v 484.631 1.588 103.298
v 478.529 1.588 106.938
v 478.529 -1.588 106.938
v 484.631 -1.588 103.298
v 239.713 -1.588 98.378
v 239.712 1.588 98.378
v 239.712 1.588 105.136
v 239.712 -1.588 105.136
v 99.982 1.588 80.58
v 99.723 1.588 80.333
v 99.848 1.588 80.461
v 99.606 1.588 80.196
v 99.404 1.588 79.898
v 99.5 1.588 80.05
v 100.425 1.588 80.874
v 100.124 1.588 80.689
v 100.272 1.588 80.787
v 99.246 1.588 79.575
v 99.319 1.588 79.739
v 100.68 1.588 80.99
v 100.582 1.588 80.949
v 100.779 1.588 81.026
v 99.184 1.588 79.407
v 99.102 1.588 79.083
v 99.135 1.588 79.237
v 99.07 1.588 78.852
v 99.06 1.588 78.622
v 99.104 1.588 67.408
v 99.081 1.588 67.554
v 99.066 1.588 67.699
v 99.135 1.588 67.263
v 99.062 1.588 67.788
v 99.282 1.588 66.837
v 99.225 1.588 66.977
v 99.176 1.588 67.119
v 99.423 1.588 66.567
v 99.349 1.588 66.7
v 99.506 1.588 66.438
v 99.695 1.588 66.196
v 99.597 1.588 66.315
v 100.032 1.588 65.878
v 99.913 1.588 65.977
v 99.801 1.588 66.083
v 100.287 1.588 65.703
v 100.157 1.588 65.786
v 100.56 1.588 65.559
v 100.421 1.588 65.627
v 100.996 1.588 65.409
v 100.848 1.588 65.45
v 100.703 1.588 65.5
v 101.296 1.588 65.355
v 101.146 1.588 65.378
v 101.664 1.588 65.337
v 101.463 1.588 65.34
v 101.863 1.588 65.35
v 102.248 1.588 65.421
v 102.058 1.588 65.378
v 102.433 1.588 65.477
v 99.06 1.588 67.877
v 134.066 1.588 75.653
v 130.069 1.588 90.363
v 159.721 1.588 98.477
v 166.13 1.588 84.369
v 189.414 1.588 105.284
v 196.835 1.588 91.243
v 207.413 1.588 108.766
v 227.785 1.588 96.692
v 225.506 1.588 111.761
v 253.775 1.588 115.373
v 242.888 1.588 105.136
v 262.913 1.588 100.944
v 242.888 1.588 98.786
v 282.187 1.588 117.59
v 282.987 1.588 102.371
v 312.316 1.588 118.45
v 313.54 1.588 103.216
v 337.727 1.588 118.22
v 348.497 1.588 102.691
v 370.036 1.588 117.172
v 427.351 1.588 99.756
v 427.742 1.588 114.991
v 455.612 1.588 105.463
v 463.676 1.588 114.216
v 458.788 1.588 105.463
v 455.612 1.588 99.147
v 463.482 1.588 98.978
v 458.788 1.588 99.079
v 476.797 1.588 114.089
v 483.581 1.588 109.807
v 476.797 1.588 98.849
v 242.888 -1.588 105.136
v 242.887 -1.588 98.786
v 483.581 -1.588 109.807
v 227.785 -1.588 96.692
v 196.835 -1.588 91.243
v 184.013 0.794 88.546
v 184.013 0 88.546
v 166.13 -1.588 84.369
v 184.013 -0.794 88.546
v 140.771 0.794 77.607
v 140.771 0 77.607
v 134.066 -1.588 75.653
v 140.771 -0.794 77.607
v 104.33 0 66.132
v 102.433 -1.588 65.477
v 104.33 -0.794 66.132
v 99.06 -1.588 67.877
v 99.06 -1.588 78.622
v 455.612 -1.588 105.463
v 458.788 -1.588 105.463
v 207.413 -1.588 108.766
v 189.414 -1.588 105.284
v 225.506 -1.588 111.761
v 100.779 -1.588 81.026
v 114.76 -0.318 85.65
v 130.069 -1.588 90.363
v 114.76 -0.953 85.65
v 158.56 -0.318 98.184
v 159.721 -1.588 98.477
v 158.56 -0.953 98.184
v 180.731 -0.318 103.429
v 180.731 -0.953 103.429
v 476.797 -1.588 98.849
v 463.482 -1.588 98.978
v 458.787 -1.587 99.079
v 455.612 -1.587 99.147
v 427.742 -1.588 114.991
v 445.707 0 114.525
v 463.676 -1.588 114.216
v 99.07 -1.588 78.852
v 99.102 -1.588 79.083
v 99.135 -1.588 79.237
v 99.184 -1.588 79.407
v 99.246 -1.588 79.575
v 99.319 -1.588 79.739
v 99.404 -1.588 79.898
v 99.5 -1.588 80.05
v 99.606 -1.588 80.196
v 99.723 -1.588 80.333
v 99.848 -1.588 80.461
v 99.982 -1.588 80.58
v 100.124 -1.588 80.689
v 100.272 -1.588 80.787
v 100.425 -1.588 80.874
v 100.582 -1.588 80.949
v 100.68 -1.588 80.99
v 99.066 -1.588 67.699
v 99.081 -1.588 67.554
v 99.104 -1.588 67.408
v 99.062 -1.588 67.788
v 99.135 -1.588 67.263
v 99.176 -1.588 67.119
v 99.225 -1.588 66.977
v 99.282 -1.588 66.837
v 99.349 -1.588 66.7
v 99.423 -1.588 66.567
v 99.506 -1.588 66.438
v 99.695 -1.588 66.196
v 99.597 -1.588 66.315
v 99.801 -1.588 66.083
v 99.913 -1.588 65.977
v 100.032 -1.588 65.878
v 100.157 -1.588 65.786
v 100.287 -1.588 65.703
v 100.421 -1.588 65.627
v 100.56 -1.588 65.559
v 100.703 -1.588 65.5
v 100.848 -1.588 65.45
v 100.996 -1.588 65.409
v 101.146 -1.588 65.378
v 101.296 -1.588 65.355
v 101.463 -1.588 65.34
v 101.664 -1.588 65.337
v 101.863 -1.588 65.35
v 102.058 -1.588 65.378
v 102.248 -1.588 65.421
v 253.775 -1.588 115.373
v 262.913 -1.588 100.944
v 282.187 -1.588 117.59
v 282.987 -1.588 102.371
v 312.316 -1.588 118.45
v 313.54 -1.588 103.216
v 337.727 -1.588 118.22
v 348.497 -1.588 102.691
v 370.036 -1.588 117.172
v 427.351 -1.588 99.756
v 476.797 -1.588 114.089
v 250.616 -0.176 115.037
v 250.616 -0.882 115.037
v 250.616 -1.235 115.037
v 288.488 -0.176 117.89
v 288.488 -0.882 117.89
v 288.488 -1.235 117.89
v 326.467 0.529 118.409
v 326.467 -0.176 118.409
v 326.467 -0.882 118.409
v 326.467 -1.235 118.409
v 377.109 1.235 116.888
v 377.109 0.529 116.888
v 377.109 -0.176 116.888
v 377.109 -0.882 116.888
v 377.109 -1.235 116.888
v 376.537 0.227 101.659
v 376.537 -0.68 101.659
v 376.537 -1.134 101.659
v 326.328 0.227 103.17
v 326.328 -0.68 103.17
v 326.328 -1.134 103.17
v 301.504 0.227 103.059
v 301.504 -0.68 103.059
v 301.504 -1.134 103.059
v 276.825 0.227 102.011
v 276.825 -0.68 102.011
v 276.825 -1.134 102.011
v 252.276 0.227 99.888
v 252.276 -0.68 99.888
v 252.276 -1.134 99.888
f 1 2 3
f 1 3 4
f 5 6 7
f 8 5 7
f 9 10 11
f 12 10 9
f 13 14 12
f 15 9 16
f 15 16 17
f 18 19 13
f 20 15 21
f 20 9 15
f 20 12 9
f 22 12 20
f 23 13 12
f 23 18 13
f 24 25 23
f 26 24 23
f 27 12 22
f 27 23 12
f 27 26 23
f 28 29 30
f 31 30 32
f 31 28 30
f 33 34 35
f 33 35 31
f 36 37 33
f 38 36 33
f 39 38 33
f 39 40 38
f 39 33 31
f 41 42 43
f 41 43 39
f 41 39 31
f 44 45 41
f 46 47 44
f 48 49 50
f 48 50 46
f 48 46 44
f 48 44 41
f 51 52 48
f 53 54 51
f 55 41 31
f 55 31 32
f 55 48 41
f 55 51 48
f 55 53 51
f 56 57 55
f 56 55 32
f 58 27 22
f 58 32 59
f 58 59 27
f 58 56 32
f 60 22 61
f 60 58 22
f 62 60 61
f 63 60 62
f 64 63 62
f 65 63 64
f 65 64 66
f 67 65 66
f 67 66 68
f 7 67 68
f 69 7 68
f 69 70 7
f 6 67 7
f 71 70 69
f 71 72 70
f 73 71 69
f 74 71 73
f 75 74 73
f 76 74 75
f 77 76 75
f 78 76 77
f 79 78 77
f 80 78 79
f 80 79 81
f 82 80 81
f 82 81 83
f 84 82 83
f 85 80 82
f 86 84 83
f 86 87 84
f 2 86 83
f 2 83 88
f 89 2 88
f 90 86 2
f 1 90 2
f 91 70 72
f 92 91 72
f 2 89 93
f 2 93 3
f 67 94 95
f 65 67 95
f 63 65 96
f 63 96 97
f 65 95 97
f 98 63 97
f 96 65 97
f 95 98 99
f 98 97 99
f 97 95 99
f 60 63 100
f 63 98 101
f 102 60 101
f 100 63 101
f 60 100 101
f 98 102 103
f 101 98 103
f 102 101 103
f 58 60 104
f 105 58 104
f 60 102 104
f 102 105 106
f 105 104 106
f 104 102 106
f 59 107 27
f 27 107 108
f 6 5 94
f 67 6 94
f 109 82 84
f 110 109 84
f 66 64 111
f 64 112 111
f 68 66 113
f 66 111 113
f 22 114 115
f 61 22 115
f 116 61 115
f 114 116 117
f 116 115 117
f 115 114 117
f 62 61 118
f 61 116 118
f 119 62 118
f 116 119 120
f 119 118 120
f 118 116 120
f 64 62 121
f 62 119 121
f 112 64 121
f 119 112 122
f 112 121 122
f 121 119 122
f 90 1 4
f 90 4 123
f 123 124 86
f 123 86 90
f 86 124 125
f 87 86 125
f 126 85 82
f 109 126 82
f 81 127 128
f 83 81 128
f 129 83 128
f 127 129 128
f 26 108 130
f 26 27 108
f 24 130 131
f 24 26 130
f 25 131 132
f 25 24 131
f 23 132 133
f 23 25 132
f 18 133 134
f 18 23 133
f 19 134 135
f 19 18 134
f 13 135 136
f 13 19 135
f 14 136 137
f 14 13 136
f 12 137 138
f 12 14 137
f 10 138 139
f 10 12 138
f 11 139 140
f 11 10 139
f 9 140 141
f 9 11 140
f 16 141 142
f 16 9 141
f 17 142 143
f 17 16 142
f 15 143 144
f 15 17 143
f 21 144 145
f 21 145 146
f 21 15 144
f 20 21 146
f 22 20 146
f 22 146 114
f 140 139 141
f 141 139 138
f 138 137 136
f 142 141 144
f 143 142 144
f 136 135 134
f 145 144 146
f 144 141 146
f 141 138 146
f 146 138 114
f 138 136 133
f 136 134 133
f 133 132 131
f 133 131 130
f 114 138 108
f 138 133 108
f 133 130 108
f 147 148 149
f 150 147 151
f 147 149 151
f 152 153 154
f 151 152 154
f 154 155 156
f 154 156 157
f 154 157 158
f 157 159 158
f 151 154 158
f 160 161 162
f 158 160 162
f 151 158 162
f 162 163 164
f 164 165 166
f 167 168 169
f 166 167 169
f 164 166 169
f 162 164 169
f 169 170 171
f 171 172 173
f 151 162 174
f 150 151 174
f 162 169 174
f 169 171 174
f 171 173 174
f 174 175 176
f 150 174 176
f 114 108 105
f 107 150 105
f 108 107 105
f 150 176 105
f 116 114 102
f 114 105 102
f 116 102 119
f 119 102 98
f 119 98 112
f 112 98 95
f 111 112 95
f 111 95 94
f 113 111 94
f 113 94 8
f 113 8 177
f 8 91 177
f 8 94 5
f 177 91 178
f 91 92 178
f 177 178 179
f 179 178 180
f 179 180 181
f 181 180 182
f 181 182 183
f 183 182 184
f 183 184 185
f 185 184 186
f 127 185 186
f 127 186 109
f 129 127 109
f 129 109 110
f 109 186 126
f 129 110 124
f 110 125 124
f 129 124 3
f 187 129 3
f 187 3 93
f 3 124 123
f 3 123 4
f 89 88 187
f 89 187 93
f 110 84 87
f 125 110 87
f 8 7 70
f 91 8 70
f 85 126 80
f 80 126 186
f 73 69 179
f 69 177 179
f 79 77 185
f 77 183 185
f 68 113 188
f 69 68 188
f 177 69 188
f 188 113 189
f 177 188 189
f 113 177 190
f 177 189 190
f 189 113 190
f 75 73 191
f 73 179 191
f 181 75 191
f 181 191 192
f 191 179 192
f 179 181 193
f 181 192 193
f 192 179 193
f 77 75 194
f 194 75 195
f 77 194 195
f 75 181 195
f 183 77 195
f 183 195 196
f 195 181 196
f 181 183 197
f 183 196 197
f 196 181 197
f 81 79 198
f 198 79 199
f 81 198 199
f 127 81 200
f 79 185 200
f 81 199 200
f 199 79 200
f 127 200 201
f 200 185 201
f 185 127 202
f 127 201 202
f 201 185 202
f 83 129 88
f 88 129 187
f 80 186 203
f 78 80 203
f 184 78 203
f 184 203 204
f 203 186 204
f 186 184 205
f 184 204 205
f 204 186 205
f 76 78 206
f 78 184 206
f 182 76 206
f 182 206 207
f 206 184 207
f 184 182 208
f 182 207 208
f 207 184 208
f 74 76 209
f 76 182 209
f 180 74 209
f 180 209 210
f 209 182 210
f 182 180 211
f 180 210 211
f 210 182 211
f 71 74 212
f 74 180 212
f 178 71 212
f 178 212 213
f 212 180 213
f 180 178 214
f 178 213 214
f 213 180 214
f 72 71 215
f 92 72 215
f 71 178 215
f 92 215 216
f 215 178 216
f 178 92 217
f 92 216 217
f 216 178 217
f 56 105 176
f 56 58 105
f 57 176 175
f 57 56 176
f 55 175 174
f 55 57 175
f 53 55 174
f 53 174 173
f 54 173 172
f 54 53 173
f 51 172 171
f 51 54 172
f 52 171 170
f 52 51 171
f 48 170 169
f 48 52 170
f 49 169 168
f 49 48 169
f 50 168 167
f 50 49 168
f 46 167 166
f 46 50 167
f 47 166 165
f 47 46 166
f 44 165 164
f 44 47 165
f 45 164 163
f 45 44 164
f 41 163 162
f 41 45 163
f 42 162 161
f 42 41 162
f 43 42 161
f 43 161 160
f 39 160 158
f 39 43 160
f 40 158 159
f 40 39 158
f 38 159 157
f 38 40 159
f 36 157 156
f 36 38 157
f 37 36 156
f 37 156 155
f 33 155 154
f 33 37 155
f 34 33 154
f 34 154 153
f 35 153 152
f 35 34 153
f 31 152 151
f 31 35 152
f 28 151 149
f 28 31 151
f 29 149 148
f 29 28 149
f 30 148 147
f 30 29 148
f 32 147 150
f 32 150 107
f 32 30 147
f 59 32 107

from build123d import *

# Parameters (mm, degrees)
BOSS_EXTRUDE1_START = -1.5875
BOSS_EXTRUDE1_DEPTH = 3.175
FILLET1_R           = 2.54
CUT_EXTRUDE1_DEPTH  = 2673.169061301
CUT_EXTRUDE2_DEPTH  = 7.62


with BuildPart() as part:
    # Boss-Extrude1: read off the stored shape, not the designer's step
    # Boss-Extrude1 outline → Boss-Extrude1 (new body)
    with BuildSketch(Plane(origin=(0, 0, 0), x_dir=(1, 0, 0), z_dir=(0, 1, 0)).offset(BOSS_EXTRUDE1_START)):
        with BuildLine():
            Line((463.481517793, -98.977696854), (427.350904327, -99.755686873))
            add(Edge.make_bspline(
                [(427.350904327, -99.755686873), (418.862421221, -100.008124614), (401.866088129, -100.608803357), (368.059852939, -102.023512545), (334.562278265, -103.305731984), (301.483653152, -103.218702016), (276.797777307, -102.194932027), (252.27640901, -100.070407207), (235.925248591, -97.923437961), (227.785190572, -96.692259941)],
                knots=[0, 0, 0, 0, 0.125038463, 0.250076927, 0.500153853, 0.625192317, 0.75023078, 0.875269244, 1.000307707, 1.000307707, 1.000307707, 1.000307707], degree=3))
            add(Edge.make_bspline(
                [(227.785190572, -96.692259941), (213.110880299, -94.472780138), (183.93469275, -89.006619914), (142.715027592, -78.571723038), (114.603726318, -69.716981467), (100.814391379, -64.915814298), (99.06, -64.297537836)],
                knots=[0.00014922, 0.00014922, 0.00014922, 0.00014922, 0.250111912, 0.500074608, 0.714106561, 0.745351898, 0.745351898, 0.745351898, 0.745351898], degree=3))
            Line((99.06, -64.297537836), (99.06, -80.435972635))
            add(Edge.make_bspline(
                [(99.06, -80.435972635), (104.274196502, -82.231853296), (109.507322686, -83.96997604), (121.992341978, -87.962504163), (129.263501237, -90.165200397), (143.866524863, -94.34435671), (151.19809916, -96.320939574), (165.92167747, -100.046969279), (173.315840114, -101.797066047), (195.561746525, -106.69261065), (210.48308935, -109.488660696), (225.506072884, -111.760877083)],
                knots=[0.284226648, 0.284226648, 0.284226648, 0.284226648, 0.375, 0.375, 0.5, 0.5, 0.625, 0.625, 0.75, 0.75, 1, 1, 1, 1], degree=3))
            add(Edge.make_bspline(
                [(225.506072884, -111.760877083), (233.858386736, -113.024158647), (242.227594967, -114.122194791), (259.003461577, -115.951963882), (267.410478961, -116.68018536), (280.049991072, -117.489002615), (284.26917928, -117.711854611), (292.706766588, -118.068182791), (296.925968196, -118.20175247), (309.584686499, -118.480744306), (318.025325165, -118.503521129), (334.908743785, -118.315005384), (343.352388312, -118.104618683), (360.233144502, -117.562255384), (368.671341038, -117.230934371), (385.546900881, -116.545322545), (393.984302215, -116.19208005), (410.861092672, -115.540392758), (419.300477696, -115.241834951), (427.741586833, -114.990806057)],
                knots=[0, 0, 0, 0, 0.125, 0.125, 0.25, 0.25, 0.3125, 0.3125, 0.375, 0.375, 0.5, 0.5, 0.625, 0.625, 0.75, 0.75, 0.875, 0.875, 1, 1, 1, 1], degree=3))
            add(Edge.make_bspline(
                [(427.741586833, -114.990806057), (433.729413487, -114.812652177), (439.717847223, -114.655194797), (451.695979443, -114.3953683), (457.68553345, -114.292726521), (463.675525417, -114.216461911)],
                knots=[0, 0, 0, 0, 0.5, 0.5, 1, 1, 1, 1], degree=3))
            add(Edge.make_bspline(
                [(463.675525417, -114.216461911), (470.785382475, -114.125939241), (477.895647472, -114.072781143), (492.116266715, -114.019175519), (499.226625181, -114.01735353), (520.557752109, -114.03824298), (534.778415195, -114.088228036), (548.999079931, -114.136269744)],
                knots=[0, 0, 0, 0, 0.25, 0.25, 0.5, 0.5, 1, 1, 1, 1], degree=3))
            add(Edge.make_bspline(
                [(548.999079931, -114.136269744), (560.220276672, -114.174178365), (571.441476667, -114.211622104), (593.883924596, -114.268599335), (605.105170909, -114.288269821), (616.326429146, -114.296606155)],
                knots=[0, 0, 0, 0, 0.5, 0.5, 1, 1, 1, 1], degree=3))
            add(Edge.make_bspline(
                [(616.326429146, -114.296606155), (632.04621738, -114.30828436), (647.765968153, -114.296774394), (679.205420393, -114.24323397), (694.925123067, -114.201950933), (726.364532125, -114.121681347), (742.0842434, -114.083543006), (773.523671883, -114.034083389), (789.243390213, -114.023396076), (820.682831325, -114.017303041), (836.402553623, -114.020240225), (867.841997843, -114.024821457), (883.561720422, -114.028722489), (915.001165911, -114.037662965), (930.720888645, -114.04209584), (962.160332218, -114.044456393), (977.880053631, -114.042025852), (1025.039240625, -114.026352661), (1056.478726331, -114.00108124), (1103.637743706, -114.076141518), (1119.357382012, -114.119430037), (1150.796589716, -114.242868384), (1166.516159417, -114.322855573), (1213.674806337, -114.596079867), (1245.113813814, -114.824335418), (1307.992068737, -115.160349225), (1339.431327838, -115.26277592), (1386.59071759, -115.166774968), (1402.310597754, -115.093136109), (1433.750539713, -114.855373393), (1449.469718126, -114.691491377), (1480.905247202, -114.282993413), (1496.621842734, -114.038617844), (1528.053234249, -113.488096449), (1543.768039181, -113.182257797), (1590.910126723, -112.184857954), (1622.335087164, -111.41358735), (1685.180622448, -109.720508747), (1716.601206009, -108.799000008), (1779.439542968, -106.858836008), (1810.857304519, -105.840460628), (1873.691027846, -103.741931839), (1905.106997705, -102.662055888), (1967.937400908, -100.449562537), (1999.351842263, -99.317220068), (2062.178442698, -96.974195187), (2093.59060921, -95.763767813), (2125.000640174, -94.480036945)],
                knots=[0, 0, 0, 0, 0.03125, 0.03125, 0.0625, 0.0625, 0.09375, 0.09375, 0.125, 0.125, 0.15625, 0.15625, 0.1875, 0.1875, 0.21875, 0.21875, 0.25, 0.25, 0.3125, 0.3125, 0.34375, 0.34375, 0.375, 0.375, 0.4375, 0.4375, 0.5, 0.5, 0.53125, 0.53125, 0.5625, 0.5625, 0.59375, 0.59375, 0.625, 0.625, 0.6875, 0.6875, 0.75, 0.75, 0.8125, 0.8125, 0.875, 0.875, 0.9375, 0.9375, 1, 1, 1, 1], degree=3))
            add(Edge.make_bspline(
                [(2125.000640174, -94.480036945), (2149.043512053, -93.497408198), (2173.084656935, -92.471430319), (2221.160511116, -90.282545134), (2245.195534081, -89.119655168), (2281.239757247, -87.221357571), (2293.253026932, -86.562238774), (2317.276292873, -85.185372522), (2329.286674963, -84.469587706), (2353.300431949, -82.936097691), (2365.303298861, -82.116745479), (2389.295700221, -80.303201383), (2401.285131688, -79.307659014), (2425.248015539, -77.107027292), (2437.219395044, -75.902126229), (2461.135042925, -73.272860721), (2473.08021873, -71.848649744), (2496.945889729, -68.786405154), (2508.867210067, -67.148439822), (2532.676751502, -63.675594501), (2544.566194734, -61.840767768), (2568.317359069, -57.993135306), (2580.179611266, -55.980432347), (2603.876576666, -51.794563265), (2615.710909808, -49.621694996), (2639.350360155, -45.125086501), (2651.156219503, -42.80151333), (2665.144217076, -39.951429742), (2667.342402296, -39.500717262), (2669.54, -39.047177022)],
                knots=[0, 0, 0, 0, 0.125, 0.125, 0.25, 0.25, 0.3125, 0.3125, 0.375, 0.375, 0.4375, 0.4375, 0.5, 0.5, 0.5625, 0.5625, 0.625, 0.625, 0.6875, 0.6875, 0.75, 0.75, 0.8125, 0.8125, 0.875, 0.875, 0.9375, 0.9375, 0.949156536, 0.949156536, 0.949156536, 0.949156536], degree=3))
            Line((2669.54, -39.047177022), (2669.54, -23.48404926))
            add(Edge.make_bspline(
                [(2124.378303089, -79.252749053), (2148.397511932, -78.271087411), (2196.441425914, -76.220230463), (2256.436326715, -73.319302978), (2304.39682767, -70.686853716), (2340.342003366, -68.544044046), (2376.169099534, -66.099901772), (2423.792254479, -62.148433447), (2483.117302519, -55.632651017), (2554.044456911, -45.226530814), (2611.906127764, -34.972755606), (2648.229540612, -27.845365737), (2663.16372025, -24.802445768), (2667.415112986, -23.925290392), (2669.54, -23.48404926)],
                knots=[0, 0, 0, 0, 0.125, 0.25, 0.3125, 0.375, 0.4375, 0.5, 0.625, 0.75, 0.875, 0.931953524, 0.943294604, 0.954635683, 0.954635683, 0.954635683, 0.954635683], degree=3))
            add(Edge.make_bspline(
                [(616.337750913, -99.056610361), (647.760496601, -99.079954266), (694.870680343, -98.960929783), (757.779786959, -98.804063039), (820.690458186, -98.765348433), (899.289299877, -98.796796583), (993.586772551, -98.812914928), (1087.931915928, -98.732357487), (1182.339530793, -99.124499499), (1276.653980681, -99.814761199), (1370.850831485, -100.131815232), (1464.98207814, -99.410819046), (1590.549452681, -97.151170263), (1747.540081264, -92.783387293), (1904.580584785, -87.479552507), (2030.204554218, -82.955875899), (2092.987058489, -80.535712121), (2124.378303089, -79.252749053)],
                knots=[0, 0, 0, 0, 0.0625, 0.09375, 0.125, 0.1875, 0.25, 0.3125, 0.375, 0.4375, 0.5, 0.5625, 0.625, 0.75, 0.875, 0.9375, 1, 1, 1, 1], degree=3))
            add(Edge.make_bspline(
                [(549.050564999, -98.89635671), (554.659992113, -98.915307063), (565.880376817, -98.952985098), (582.701799226, -99.002380959), (599.520778593, -99.038450073), (610.731968981, -99.052445795), (616.337750913, -99.056610361)],
                knots=[0, 0, 0, 0, 0.25, 0.5, 0.75, 1, 1, 1, 1], degree=3))
            add(Edge.make_bspline(
                [(463.481517793, -98.977696854), (470.636830327, -98.886595426), (484.965179859, -98.780290974), (506.357680509, -98.775608099), (527.715649674, -98.823220556), (541.937533288, -98.872326737), (549.050564999, -98.89635671)],
                knots=[0, 0, 0, 0, 0.25, 0.5, 0.75, 1, 1, 1, 1], degree=3))
        make_face()
    extrude(amount=BOSS_EXTRUDE1_DEPTH)

    # Fillet1
    fillet1_edges = [part.edges().sort_by_distance(p)[0] for p in [
        (2669.54, 0, 39.047177022),
        (2669.54, 0, 23.48404926),
        (99.06, 0, 64.297537836),
        (99.06, 0, 80.435972635),
    ]]
    fillet(fillet1_edges, radius=FILLET1_R)

    # Sketch2 → Cut-Extrude1 (cut, through all)
    with BuildSketch(Plane(origin=(0, 1.5875, 0), x_dir=(1, 0, 0), z_dir=(0, 1, 0))):
        Polygon((458.7875, -99.078771778), (455.6125, -99.147138132), (455.6125, -105.462954955), (458.7875, -105.462954955), align=None)
        with BuildLine():
            Line((2487.6125, -54.614044682), (2487.6125, -60.756097975))
            Line((2487.6125, -60.756097975), (2490.7875, -60.756097975))
            Line((2490.7875, -60.756097975), (2490.7875, -54.196862137))
            add(Edge.make_bspline(
                [(2490.7875, -54.196862137), (2489.72925344, -54.336769839), (2488.670920227, -54.475833001), (2487.6125, -54.614044682)],
                knots=[0.635778938, 0.635778938, 0.635778938, 0.635778938, 0.641365892, 0.641365892, 0.641365892, 0.641365892], degree=3))
        make_face()
        with BuildLine():
            Line((2309.8125, -70.346479383), (2309.8125, -75.33420721))
            Line((2309.8125, -75.33420721), (2312.9875, -75.33420721))
            Line((2312.9875, -75.33420721), (2312.9875, -70.161551132))
            add(Edge.make_bspline(
                [(2312.9875, -70.161551132), (2311.929224732, -70.223449083), (2310.870887845, -70.285086749), (2309.8125, -70.346479383)],
                knots=[0.324680898, 0.324680898, 0.324680898, 0.324680898, 0.330200553, 0.330200553, 0.330200553, 0.330200553], degree=3))
        make_face()
        with BuildLine():
            Line((2132.0125, -78.939241639), (2132.0125, -85.223663793))
            Line((2132.0125, -85.223663793), (2135.1875, -85.223663793))
            Line((2135.1875, -85.223663793), (2135.1875, -78.807949765))
            add(Edge.make_bspline(
                [(2135.1875, -78.807949765), (2134.129165205, -78.851804918), (2133.070831452, -78.8955682), (2132.0125, -78.939241639)],
                knots=[0.015996912, 0.015996912, 0.015996912, 0.015996912, 0.021504552, 0.021504552, 0.021504552, 0.021504552], degree=3))
        make_face()
        with BuildLine():
            Line((2005.0125, -83.846915394), (2005.0125, -90.138723071))
            Line((2005.0125, -90.138723071), (2008.1875, -90.138723071))
            Line((2008.1875, -90.138723071), (2008.1875, -83.730469865))
            add(Edge.make_bspline(
                [(2008.1875, -83.730469865), (2007.129173184, -83.769325496), (2006.070839765, -83.808140465), (2005.0125, -83.846915394)],
                knots=[0.921843858, 0.921843858, 0.921843858, 0.921843858, 0.923950286, 0.923950286, 0.923950286, 0.923950286], degree=3))
        make_face()
        with BuildLine():
            Line((1827.2125, -90.049540749), (1827.2125, -96.347044402))
            Line((1827.2125, -96.347044402), (1830.3875, -96.347044402))
            Line((1830.3875, -96.347044402), (1830.3875, -89.944485596))
            add(Edge.make_bspline(
                [(1830.3875, -89.944485596), (1829.32916541, -89.979545586), (1828.270832057, -90.01456412), (1827.2125, -90.049540749)],
                knots=[0.803899516, 0.803899516, 0.803899516, 0.803899516, 0.806005654, 0.806005654, 0.806005654, 0.806005654], degree=3))
        make_face()
        with BuildLine():
            Line((1649.4125, -95.434799369), (1649.4125, -101.74230383))
            Line((1649.4125, -101.74230383), (1652.5875, -101.74230383))
            Line((1652.5875, -101.74230383), (1652.5875, -95.349679657))
            add(Edge.make_bspline(
                [(1652.5875, -95.349679657), (1651.529164065, -95.378138541), (1650.470830734, -95.406512136), (1649.4125, -95.434799369)],
                knots=[0.68594206, 0.68594206, 0.68594206, 0.68594206, 0.688048735, 0.688048735, 0.688048735, 0.688048735], degree=3))
        make_face()
        with BuildLine():
            Line((1471.6125, -99.161176944), (1471.6125, -105.489537584))
            Line((1471.6125, -105.489537584), (1474.7875, -105.489537584))
            Line((1474.7875, -105.489537584), (1474.7875, -99.117630423))
            add(Edge.make_bspline(
                [(1474.7875, -99.117630423), (1473.729158832, -99.132324193), (1472.670825431, -99.146840459), (1471.6125, -99.161176944)],
                knots=[0.567950133, 0.567950133, 0.567950133, 0.567950133, 0.570057648, 0.570057648, 0.570057648, 0.570057648], degree=3))
        make_face()
        with BuildLine():
            Line((1293.8125, -99.83749143), (1293.8125, -106.18749143))
            Line((1293.8125, -106.18749143), (1296.9875, -106.18749143))
            Line((1296.9875, -106.18749143), (1296.9875, -99.851512251))
            add(Edge.make_bspline(
                [(1296.9875, -99.851512251), (1295.929186903, -99.846935009), (1294.87085368, -99.842259989), (1293.8125, -99.83749143)],
                knots=[0.449944799, 0.449944799, 0.449944799, 0.449944799, 0.452050611, 0.452050611, 0.452050611, 0.452050611], degree=3))
        make_face()
        with BuildLine():
            Line((1116.0125, -98.877614065), (1116.0125, -105.232528283))
            Line((1116.0125, -105.232528283), (1119.1875, -105.232528283))
            Line((1119.1875, -105.232528283), (1119.1875, -98.887560686))
            add(Edge.make_bspline(
                [(1119.1875, -98.887560686), (1118.129164273, -98.884166533), (1117.07083061, -98.880850623), (1116.0125, -98.877614065)],
                knots=[0.332139046, 0.332139046, 0.332139046, 0.332139046, 0.334241398, 0.334241398, 0.334241398, 0.334241398], degree=3))
        make_face()
        with BuildLine():
            Line((823.9125, -98.777475421), (823.9125, -105.127430466))
            Line((823.9125, -105.127430466), (827.0875, -105.127430466))
            Line((827.0875, -105.127430466), (827.0875, -98.777412477))
            add(Edge.make_bspline(
                [(827.0875, -98.777412477), (826.029176824, -98.777415639), (824.97084358, -98.777436304), (823.9125, -98.777475421)],
                knots=[0.138607063, 0.138607063, 0.138607063, 0.138607063, 0.140710549, 0.140710549, 0.140710549, 0.140710549], degree=3))
        make_face()
        with BuildLine():
            Line((608.0125, -99.04838129), (608.0125, -105.400261054))
            Line((608.0125, -105.400261054), (611.1875, -105.400261054))
            Line((611.1875, -105.400261054), (611.1875, -99.051996207))
            add(Edge.make_bspline(
                [(611.1875, -99.051996207), (610.129167277, -99.050888003), (609.070835183, -99.049682312), (608.0125, -99.04838129)],
                knots=[0.899838455, 0.899838455, 0.899838455, 0.899838455, 0.947037247, 0.947037247, 0.947037247, 0.947037247], degree=3))
        make_face()
        with BuildLine():
            Line((242.8875, -105.135594032), (242.8875, -98.785594032))
            add(Edge.make_bspline(
                [(242.8875, -98.785594032), (241.828921211, -98.652522157), (240.770561473, -98.516544317), (239.7125, -98.37771481)],
                knots=[0.923143429, 0.923143429, 0.923143429, 0.923143429, 0.939344476, 0.939344476, 0.939344476, 0.939344476], degree=3))
            Line((239.7125, -98.37771481), (239.7125, -105.135594032))
            Line((239.7125, -105.135594032), (242.8875, -105.135594032))
        make_face()
    extrude(amount=-CUT_EXTRUDE1_DEPTH, mode=Mode.SUBTRACT)

    # Sketch3 → Cut-Extrude2 (cut)
    with BuildSketch(Plane(origin=(0, 1.5875, 0), x_dir=(1, 0, 0), z_dir=(0, 1, 0))):
        Polygon((476.797041743, -98.849097611), (476.797041743, 40.917218584), (2972.510848893, 148.094696625), (2617.465456777, -477.099950745), (476.797041743, -122.958691564), (476.797041743, -114.089259739), (483.581134609, -109.807059007), (478.528826473, -106.937874617), (484.630988809, -103.297962968), align=None)
    extrude(amount=-CUT_EXTRUDE2_DEPTH, mode=Mode.SUBTRACT)


solid = part.part
